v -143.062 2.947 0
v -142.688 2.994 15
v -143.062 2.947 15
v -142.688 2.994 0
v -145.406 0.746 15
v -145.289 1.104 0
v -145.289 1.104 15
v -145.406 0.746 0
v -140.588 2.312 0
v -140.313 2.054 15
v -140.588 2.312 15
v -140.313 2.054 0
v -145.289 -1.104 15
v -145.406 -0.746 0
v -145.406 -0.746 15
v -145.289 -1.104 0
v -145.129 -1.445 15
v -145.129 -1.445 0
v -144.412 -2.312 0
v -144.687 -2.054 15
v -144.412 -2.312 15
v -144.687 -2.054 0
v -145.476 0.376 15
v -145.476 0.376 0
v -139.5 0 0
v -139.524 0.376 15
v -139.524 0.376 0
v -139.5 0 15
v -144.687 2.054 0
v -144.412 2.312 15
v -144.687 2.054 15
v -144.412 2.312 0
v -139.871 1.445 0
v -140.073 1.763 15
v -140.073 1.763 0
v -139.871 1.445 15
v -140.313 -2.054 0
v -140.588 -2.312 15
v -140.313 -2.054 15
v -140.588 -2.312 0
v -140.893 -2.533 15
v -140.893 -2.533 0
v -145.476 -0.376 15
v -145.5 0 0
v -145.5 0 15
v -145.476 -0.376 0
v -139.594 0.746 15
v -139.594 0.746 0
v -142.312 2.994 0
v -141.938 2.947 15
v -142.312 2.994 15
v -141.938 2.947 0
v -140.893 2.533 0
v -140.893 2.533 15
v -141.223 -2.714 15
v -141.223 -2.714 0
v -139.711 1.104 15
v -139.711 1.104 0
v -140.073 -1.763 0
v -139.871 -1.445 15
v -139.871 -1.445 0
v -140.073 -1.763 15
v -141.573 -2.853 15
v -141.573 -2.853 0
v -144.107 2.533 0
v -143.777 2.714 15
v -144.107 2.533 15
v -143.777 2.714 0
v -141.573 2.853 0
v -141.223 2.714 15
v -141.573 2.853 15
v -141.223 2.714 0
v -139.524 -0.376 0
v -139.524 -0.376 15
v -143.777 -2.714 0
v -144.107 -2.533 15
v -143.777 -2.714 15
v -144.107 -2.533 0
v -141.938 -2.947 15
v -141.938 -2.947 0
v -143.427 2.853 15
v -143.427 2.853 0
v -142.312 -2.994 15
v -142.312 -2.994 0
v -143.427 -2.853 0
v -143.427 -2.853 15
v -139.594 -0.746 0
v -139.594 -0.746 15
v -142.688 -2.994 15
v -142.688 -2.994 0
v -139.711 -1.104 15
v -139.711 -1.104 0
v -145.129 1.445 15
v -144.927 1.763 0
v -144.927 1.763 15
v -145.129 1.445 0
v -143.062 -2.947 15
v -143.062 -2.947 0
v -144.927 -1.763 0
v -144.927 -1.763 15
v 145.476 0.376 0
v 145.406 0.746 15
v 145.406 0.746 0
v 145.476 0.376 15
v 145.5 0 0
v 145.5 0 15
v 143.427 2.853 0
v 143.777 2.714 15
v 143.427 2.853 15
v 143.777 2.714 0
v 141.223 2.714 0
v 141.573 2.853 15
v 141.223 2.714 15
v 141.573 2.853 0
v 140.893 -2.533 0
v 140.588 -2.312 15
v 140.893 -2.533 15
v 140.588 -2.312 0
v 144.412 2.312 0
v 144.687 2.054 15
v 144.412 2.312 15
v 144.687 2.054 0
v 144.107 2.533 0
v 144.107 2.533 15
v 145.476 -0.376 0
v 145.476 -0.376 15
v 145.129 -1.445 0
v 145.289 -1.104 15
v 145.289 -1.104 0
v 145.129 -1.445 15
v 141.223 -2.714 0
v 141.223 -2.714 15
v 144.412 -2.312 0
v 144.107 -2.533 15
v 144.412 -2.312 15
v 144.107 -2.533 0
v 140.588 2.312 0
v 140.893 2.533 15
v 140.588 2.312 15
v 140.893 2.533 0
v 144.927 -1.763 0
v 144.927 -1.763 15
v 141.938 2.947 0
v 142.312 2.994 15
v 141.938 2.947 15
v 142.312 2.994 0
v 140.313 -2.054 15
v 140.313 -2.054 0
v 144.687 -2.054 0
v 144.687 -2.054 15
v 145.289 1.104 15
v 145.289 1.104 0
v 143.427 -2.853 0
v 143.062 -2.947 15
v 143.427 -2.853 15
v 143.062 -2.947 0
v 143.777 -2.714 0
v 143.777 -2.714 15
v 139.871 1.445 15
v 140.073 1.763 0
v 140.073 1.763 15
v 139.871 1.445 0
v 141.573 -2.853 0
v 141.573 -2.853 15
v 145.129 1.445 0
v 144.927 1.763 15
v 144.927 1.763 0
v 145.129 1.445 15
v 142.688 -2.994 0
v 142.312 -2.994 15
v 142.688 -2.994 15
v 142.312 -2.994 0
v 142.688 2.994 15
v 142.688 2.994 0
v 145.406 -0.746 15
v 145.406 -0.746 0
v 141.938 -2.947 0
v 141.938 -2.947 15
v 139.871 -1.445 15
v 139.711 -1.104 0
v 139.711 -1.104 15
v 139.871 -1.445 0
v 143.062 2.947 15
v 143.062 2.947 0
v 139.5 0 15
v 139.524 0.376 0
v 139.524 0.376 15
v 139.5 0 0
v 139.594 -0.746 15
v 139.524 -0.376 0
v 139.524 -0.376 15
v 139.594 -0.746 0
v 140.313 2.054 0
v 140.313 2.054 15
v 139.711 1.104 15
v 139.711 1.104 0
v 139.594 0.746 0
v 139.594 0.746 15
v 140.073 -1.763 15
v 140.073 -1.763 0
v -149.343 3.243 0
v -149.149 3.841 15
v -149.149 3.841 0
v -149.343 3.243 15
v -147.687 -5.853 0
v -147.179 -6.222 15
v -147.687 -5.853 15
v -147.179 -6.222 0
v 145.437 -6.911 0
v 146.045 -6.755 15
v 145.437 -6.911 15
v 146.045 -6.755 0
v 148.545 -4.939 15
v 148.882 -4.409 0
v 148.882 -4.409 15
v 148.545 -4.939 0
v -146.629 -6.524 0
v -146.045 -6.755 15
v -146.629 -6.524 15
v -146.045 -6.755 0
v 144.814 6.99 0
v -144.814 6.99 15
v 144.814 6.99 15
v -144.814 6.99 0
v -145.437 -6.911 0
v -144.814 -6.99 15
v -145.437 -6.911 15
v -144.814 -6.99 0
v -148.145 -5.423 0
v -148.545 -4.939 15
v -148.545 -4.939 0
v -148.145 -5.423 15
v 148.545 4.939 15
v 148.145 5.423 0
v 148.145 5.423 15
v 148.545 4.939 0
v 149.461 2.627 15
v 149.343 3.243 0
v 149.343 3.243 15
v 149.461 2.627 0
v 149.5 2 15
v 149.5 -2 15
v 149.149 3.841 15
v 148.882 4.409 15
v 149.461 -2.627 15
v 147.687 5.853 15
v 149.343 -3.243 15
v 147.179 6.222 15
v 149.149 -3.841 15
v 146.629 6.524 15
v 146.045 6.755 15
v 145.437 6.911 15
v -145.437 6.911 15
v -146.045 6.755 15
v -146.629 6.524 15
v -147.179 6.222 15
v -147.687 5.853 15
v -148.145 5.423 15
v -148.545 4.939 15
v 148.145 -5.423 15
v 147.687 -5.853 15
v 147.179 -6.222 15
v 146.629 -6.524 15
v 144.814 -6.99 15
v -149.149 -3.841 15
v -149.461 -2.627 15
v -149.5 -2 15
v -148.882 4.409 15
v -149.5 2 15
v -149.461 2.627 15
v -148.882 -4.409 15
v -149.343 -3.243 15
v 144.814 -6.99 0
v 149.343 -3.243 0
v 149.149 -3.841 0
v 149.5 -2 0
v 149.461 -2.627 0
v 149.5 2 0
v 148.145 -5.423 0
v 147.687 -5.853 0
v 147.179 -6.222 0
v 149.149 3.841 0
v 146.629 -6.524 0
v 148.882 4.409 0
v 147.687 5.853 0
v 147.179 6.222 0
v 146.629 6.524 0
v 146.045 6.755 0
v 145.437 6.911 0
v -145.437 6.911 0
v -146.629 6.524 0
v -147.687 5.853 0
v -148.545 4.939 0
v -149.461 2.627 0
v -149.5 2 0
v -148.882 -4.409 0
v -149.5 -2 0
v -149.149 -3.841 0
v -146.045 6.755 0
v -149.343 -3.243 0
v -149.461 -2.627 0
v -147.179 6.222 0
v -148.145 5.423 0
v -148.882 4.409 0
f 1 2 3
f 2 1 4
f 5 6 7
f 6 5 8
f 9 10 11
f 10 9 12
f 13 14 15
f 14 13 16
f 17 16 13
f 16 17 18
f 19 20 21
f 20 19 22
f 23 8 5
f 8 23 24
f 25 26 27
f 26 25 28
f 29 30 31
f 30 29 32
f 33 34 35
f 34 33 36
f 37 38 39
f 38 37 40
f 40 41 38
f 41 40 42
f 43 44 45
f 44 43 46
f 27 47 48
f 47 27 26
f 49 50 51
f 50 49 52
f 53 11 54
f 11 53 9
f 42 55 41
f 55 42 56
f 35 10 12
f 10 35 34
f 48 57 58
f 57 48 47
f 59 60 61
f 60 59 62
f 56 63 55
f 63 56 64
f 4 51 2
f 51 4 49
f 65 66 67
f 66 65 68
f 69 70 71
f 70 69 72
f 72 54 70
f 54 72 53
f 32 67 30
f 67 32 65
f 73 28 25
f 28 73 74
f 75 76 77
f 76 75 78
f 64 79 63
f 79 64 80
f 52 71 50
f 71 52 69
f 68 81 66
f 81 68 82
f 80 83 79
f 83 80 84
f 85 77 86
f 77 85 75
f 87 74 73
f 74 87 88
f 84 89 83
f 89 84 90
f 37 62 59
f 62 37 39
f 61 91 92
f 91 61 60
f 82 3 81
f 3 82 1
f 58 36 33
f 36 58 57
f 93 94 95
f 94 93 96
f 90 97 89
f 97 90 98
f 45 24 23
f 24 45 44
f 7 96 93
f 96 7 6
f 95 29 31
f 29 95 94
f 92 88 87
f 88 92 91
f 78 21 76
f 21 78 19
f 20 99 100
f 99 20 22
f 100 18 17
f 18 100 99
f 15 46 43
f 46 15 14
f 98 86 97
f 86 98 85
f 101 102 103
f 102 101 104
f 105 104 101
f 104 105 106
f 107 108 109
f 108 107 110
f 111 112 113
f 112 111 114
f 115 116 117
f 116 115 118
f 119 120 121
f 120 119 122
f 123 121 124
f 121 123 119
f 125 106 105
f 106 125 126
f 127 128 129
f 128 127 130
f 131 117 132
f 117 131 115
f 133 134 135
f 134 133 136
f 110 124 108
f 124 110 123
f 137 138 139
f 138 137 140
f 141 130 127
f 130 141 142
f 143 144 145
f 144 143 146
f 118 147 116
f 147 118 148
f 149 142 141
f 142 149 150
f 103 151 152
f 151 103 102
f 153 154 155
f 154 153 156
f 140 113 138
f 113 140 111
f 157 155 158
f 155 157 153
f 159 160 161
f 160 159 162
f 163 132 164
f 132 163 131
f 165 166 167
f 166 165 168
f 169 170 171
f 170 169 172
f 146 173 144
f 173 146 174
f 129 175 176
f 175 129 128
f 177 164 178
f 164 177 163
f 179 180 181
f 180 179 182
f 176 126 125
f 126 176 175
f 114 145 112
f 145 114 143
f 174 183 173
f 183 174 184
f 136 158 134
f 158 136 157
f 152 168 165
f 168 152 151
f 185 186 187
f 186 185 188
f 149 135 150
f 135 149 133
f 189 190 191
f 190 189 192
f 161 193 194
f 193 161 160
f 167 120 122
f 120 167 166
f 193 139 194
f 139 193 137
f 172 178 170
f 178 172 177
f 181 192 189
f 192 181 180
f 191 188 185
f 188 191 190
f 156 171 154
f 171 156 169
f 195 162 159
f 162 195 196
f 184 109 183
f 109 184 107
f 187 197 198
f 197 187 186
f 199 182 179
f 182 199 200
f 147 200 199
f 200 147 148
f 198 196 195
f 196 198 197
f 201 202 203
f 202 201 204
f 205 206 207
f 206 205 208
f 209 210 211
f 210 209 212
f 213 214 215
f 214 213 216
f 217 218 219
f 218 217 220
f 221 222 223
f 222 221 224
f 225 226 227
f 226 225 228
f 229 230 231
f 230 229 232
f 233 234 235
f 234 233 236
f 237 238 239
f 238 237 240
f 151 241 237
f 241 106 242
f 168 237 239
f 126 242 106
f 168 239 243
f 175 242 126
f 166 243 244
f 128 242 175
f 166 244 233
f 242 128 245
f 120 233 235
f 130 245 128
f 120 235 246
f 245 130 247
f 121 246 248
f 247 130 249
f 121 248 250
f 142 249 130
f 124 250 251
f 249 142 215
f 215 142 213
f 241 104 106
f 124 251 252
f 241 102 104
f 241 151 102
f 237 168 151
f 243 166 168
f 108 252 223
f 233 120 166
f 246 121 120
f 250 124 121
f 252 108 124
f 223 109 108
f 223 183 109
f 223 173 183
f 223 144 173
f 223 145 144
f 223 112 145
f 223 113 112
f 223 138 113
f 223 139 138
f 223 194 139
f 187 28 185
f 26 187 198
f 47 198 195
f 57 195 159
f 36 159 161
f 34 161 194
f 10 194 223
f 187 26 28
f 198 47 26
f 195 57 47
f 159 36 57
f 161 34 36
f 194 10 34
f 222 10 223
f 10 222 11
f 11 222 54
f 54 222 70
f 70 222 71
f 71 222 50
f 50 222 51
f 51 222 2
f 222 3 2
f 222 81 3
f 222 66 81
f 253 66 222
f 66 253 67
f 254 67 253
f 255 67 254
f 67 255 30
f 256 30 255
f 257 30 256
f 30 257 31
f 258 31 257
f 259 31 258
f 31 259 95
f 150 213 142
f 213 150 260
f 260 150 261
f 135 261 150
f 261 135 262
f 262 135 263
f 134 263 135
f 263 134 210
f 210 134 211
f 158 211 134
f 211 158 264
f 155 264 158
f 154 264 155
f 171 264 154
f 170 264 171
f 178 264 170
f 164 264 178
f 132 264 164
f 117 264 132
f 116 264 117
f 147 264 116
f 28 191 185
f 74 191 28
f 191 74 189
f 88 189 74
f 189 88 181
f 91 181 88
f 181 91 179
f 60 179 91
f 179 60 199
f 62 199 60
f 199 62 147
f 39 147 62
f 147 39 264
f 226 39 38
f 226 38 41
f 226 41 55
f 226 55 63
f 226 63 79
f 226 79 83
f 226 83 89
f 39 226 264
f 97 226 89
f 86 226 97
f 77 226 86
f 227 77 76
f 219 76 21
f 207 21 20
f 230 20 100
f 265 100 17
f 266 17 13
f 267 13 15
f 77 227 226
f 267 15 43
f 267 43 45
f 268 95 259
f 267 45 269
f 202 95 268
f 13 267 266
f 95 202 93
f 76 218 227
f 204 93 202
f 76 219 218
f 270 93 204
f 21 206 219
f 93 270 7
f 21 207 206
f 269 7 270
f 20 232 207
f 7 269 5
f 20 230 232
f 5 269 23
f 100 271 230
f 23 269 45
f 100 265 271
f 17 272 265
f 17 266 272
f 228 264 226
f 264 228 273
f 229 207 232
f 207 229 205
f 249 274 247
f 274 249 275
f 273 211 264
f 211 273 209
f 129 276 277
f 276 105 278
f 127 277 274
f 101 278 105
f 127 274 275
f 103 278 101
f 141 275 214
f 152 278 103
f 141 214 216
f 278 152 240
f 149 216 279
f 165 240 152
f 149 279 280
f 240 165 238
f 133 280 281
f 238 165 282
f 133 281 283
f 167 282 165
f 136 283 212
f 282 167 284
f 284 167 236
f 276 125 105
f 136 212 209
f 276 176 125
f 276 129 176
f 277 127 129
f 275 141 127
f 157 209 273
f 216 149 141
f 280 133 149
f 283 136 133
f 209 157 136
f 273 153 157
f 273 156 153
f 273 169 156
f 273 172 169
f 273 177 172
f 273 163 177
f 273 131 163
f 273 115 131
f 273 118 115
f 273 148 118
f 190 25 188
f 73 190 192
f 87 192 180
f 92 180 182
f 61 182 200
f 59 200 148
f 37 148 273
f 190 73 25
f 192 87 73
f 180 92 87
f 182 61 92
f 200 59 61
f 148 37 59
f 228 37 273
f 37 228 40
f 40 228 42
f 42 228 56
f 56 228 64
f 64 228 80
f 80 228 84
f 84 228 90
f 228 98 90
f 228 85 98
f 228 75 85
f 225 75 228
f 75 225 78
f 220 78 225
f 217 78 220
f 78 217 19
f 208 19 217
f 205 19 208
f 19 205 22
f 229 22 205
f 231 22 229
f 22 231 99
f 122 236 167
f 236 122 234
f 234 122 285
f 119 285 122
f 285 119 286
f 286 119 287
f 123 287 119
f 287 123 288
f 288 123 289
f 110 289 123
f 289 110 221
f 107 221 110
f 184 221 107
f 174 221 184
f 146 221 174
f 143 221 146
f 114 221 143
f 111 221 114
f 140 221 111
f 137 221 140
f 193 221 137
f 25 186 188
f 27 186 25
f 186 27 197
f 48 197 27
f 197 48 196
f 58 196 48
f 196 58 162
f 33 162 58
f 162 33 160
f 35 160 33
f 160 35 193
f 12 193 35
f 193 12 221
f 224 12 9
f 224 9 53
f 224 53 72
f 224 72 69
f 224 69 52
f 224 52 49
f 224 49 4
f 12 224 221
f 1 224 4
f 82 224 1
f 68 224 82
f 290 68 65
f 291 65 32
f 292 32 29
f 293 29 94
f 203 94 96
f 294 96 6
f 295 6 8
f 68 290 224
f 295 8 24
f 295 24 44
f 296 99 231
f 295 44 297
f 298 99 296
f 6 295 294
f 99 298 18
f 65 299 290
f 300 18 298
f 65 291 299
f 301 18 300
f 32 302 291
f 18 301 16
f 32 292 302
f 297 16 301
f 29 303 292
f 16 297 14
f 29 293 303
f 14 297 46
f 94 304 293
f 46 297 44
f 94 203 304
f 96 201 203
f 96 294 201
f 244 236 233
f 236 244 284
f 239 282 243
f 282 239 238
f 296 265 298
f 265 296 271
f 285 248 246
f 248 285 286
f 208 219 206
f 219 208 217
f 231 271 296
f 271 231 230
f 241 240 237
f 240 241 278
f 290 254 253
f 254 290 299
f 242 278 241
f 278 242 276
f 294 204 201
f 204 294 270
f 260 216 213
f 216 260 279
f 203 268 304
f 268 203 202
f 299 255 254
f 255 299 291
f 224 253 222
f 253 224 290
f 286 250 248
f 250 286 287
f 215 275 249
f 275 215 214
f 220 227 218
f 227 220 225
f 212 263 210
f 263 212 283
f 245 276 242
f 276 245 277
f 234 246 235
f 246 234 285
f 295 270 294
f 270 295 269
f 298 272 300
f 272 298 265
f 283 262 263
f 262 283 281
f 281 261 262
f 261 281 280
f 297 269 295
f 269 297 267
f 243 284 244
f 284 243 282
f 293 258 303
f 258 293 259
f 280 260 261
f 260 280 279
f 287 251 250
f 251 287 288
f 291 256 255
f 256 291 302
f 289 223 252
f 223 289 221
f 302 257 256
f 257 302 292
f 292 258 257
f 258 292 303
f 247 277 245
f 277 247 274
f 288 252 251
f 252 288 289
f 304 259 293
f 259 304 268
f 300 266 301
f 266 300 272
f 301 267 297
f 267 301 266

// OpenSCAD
$fn = 50;


difference() {
	union() {
		hull() {
			translate(v = [-144.5000000000, 2.0000000000, 0]) {
				cylinder(h = 15, r = 5);
			}
			translate(v = [144.5000000000, 2.0000000000, 0]) {
				cylinder(h = 15, r = 5);
			}
			translate(v = [-144.5000000000, -2.0000000000, 0]) {
				cylinder(h = 15, r = 5);
			}
			translate(v = [144.5000000000, -2.0000000000, 0]) {
				cylinder(h = 15, r = 5);
			}
		}
	}
	union() {
		translate(v = [-142.5000000000, 0.0000000000, -100.0000000000]) {
			cylinder(h = 200, r = 3.0000000000);
		}
		translate(v = [-142.5000000000, 0.0000000000, -100.0000000000]) {
			cylinder(h = 200, r = 3.0000000000);
		}
		translate(v = [142.5000000000, 0.0000000000, -100.0000000000]) {
			cylinder(h = 200, r = 3.0000000000);
		}
		translate(v = [142.5000000000, 0.0000000000, -100.0000000000]) {
			cylinder(h = 200, r = 3.0000000000);
		}
	}
}
